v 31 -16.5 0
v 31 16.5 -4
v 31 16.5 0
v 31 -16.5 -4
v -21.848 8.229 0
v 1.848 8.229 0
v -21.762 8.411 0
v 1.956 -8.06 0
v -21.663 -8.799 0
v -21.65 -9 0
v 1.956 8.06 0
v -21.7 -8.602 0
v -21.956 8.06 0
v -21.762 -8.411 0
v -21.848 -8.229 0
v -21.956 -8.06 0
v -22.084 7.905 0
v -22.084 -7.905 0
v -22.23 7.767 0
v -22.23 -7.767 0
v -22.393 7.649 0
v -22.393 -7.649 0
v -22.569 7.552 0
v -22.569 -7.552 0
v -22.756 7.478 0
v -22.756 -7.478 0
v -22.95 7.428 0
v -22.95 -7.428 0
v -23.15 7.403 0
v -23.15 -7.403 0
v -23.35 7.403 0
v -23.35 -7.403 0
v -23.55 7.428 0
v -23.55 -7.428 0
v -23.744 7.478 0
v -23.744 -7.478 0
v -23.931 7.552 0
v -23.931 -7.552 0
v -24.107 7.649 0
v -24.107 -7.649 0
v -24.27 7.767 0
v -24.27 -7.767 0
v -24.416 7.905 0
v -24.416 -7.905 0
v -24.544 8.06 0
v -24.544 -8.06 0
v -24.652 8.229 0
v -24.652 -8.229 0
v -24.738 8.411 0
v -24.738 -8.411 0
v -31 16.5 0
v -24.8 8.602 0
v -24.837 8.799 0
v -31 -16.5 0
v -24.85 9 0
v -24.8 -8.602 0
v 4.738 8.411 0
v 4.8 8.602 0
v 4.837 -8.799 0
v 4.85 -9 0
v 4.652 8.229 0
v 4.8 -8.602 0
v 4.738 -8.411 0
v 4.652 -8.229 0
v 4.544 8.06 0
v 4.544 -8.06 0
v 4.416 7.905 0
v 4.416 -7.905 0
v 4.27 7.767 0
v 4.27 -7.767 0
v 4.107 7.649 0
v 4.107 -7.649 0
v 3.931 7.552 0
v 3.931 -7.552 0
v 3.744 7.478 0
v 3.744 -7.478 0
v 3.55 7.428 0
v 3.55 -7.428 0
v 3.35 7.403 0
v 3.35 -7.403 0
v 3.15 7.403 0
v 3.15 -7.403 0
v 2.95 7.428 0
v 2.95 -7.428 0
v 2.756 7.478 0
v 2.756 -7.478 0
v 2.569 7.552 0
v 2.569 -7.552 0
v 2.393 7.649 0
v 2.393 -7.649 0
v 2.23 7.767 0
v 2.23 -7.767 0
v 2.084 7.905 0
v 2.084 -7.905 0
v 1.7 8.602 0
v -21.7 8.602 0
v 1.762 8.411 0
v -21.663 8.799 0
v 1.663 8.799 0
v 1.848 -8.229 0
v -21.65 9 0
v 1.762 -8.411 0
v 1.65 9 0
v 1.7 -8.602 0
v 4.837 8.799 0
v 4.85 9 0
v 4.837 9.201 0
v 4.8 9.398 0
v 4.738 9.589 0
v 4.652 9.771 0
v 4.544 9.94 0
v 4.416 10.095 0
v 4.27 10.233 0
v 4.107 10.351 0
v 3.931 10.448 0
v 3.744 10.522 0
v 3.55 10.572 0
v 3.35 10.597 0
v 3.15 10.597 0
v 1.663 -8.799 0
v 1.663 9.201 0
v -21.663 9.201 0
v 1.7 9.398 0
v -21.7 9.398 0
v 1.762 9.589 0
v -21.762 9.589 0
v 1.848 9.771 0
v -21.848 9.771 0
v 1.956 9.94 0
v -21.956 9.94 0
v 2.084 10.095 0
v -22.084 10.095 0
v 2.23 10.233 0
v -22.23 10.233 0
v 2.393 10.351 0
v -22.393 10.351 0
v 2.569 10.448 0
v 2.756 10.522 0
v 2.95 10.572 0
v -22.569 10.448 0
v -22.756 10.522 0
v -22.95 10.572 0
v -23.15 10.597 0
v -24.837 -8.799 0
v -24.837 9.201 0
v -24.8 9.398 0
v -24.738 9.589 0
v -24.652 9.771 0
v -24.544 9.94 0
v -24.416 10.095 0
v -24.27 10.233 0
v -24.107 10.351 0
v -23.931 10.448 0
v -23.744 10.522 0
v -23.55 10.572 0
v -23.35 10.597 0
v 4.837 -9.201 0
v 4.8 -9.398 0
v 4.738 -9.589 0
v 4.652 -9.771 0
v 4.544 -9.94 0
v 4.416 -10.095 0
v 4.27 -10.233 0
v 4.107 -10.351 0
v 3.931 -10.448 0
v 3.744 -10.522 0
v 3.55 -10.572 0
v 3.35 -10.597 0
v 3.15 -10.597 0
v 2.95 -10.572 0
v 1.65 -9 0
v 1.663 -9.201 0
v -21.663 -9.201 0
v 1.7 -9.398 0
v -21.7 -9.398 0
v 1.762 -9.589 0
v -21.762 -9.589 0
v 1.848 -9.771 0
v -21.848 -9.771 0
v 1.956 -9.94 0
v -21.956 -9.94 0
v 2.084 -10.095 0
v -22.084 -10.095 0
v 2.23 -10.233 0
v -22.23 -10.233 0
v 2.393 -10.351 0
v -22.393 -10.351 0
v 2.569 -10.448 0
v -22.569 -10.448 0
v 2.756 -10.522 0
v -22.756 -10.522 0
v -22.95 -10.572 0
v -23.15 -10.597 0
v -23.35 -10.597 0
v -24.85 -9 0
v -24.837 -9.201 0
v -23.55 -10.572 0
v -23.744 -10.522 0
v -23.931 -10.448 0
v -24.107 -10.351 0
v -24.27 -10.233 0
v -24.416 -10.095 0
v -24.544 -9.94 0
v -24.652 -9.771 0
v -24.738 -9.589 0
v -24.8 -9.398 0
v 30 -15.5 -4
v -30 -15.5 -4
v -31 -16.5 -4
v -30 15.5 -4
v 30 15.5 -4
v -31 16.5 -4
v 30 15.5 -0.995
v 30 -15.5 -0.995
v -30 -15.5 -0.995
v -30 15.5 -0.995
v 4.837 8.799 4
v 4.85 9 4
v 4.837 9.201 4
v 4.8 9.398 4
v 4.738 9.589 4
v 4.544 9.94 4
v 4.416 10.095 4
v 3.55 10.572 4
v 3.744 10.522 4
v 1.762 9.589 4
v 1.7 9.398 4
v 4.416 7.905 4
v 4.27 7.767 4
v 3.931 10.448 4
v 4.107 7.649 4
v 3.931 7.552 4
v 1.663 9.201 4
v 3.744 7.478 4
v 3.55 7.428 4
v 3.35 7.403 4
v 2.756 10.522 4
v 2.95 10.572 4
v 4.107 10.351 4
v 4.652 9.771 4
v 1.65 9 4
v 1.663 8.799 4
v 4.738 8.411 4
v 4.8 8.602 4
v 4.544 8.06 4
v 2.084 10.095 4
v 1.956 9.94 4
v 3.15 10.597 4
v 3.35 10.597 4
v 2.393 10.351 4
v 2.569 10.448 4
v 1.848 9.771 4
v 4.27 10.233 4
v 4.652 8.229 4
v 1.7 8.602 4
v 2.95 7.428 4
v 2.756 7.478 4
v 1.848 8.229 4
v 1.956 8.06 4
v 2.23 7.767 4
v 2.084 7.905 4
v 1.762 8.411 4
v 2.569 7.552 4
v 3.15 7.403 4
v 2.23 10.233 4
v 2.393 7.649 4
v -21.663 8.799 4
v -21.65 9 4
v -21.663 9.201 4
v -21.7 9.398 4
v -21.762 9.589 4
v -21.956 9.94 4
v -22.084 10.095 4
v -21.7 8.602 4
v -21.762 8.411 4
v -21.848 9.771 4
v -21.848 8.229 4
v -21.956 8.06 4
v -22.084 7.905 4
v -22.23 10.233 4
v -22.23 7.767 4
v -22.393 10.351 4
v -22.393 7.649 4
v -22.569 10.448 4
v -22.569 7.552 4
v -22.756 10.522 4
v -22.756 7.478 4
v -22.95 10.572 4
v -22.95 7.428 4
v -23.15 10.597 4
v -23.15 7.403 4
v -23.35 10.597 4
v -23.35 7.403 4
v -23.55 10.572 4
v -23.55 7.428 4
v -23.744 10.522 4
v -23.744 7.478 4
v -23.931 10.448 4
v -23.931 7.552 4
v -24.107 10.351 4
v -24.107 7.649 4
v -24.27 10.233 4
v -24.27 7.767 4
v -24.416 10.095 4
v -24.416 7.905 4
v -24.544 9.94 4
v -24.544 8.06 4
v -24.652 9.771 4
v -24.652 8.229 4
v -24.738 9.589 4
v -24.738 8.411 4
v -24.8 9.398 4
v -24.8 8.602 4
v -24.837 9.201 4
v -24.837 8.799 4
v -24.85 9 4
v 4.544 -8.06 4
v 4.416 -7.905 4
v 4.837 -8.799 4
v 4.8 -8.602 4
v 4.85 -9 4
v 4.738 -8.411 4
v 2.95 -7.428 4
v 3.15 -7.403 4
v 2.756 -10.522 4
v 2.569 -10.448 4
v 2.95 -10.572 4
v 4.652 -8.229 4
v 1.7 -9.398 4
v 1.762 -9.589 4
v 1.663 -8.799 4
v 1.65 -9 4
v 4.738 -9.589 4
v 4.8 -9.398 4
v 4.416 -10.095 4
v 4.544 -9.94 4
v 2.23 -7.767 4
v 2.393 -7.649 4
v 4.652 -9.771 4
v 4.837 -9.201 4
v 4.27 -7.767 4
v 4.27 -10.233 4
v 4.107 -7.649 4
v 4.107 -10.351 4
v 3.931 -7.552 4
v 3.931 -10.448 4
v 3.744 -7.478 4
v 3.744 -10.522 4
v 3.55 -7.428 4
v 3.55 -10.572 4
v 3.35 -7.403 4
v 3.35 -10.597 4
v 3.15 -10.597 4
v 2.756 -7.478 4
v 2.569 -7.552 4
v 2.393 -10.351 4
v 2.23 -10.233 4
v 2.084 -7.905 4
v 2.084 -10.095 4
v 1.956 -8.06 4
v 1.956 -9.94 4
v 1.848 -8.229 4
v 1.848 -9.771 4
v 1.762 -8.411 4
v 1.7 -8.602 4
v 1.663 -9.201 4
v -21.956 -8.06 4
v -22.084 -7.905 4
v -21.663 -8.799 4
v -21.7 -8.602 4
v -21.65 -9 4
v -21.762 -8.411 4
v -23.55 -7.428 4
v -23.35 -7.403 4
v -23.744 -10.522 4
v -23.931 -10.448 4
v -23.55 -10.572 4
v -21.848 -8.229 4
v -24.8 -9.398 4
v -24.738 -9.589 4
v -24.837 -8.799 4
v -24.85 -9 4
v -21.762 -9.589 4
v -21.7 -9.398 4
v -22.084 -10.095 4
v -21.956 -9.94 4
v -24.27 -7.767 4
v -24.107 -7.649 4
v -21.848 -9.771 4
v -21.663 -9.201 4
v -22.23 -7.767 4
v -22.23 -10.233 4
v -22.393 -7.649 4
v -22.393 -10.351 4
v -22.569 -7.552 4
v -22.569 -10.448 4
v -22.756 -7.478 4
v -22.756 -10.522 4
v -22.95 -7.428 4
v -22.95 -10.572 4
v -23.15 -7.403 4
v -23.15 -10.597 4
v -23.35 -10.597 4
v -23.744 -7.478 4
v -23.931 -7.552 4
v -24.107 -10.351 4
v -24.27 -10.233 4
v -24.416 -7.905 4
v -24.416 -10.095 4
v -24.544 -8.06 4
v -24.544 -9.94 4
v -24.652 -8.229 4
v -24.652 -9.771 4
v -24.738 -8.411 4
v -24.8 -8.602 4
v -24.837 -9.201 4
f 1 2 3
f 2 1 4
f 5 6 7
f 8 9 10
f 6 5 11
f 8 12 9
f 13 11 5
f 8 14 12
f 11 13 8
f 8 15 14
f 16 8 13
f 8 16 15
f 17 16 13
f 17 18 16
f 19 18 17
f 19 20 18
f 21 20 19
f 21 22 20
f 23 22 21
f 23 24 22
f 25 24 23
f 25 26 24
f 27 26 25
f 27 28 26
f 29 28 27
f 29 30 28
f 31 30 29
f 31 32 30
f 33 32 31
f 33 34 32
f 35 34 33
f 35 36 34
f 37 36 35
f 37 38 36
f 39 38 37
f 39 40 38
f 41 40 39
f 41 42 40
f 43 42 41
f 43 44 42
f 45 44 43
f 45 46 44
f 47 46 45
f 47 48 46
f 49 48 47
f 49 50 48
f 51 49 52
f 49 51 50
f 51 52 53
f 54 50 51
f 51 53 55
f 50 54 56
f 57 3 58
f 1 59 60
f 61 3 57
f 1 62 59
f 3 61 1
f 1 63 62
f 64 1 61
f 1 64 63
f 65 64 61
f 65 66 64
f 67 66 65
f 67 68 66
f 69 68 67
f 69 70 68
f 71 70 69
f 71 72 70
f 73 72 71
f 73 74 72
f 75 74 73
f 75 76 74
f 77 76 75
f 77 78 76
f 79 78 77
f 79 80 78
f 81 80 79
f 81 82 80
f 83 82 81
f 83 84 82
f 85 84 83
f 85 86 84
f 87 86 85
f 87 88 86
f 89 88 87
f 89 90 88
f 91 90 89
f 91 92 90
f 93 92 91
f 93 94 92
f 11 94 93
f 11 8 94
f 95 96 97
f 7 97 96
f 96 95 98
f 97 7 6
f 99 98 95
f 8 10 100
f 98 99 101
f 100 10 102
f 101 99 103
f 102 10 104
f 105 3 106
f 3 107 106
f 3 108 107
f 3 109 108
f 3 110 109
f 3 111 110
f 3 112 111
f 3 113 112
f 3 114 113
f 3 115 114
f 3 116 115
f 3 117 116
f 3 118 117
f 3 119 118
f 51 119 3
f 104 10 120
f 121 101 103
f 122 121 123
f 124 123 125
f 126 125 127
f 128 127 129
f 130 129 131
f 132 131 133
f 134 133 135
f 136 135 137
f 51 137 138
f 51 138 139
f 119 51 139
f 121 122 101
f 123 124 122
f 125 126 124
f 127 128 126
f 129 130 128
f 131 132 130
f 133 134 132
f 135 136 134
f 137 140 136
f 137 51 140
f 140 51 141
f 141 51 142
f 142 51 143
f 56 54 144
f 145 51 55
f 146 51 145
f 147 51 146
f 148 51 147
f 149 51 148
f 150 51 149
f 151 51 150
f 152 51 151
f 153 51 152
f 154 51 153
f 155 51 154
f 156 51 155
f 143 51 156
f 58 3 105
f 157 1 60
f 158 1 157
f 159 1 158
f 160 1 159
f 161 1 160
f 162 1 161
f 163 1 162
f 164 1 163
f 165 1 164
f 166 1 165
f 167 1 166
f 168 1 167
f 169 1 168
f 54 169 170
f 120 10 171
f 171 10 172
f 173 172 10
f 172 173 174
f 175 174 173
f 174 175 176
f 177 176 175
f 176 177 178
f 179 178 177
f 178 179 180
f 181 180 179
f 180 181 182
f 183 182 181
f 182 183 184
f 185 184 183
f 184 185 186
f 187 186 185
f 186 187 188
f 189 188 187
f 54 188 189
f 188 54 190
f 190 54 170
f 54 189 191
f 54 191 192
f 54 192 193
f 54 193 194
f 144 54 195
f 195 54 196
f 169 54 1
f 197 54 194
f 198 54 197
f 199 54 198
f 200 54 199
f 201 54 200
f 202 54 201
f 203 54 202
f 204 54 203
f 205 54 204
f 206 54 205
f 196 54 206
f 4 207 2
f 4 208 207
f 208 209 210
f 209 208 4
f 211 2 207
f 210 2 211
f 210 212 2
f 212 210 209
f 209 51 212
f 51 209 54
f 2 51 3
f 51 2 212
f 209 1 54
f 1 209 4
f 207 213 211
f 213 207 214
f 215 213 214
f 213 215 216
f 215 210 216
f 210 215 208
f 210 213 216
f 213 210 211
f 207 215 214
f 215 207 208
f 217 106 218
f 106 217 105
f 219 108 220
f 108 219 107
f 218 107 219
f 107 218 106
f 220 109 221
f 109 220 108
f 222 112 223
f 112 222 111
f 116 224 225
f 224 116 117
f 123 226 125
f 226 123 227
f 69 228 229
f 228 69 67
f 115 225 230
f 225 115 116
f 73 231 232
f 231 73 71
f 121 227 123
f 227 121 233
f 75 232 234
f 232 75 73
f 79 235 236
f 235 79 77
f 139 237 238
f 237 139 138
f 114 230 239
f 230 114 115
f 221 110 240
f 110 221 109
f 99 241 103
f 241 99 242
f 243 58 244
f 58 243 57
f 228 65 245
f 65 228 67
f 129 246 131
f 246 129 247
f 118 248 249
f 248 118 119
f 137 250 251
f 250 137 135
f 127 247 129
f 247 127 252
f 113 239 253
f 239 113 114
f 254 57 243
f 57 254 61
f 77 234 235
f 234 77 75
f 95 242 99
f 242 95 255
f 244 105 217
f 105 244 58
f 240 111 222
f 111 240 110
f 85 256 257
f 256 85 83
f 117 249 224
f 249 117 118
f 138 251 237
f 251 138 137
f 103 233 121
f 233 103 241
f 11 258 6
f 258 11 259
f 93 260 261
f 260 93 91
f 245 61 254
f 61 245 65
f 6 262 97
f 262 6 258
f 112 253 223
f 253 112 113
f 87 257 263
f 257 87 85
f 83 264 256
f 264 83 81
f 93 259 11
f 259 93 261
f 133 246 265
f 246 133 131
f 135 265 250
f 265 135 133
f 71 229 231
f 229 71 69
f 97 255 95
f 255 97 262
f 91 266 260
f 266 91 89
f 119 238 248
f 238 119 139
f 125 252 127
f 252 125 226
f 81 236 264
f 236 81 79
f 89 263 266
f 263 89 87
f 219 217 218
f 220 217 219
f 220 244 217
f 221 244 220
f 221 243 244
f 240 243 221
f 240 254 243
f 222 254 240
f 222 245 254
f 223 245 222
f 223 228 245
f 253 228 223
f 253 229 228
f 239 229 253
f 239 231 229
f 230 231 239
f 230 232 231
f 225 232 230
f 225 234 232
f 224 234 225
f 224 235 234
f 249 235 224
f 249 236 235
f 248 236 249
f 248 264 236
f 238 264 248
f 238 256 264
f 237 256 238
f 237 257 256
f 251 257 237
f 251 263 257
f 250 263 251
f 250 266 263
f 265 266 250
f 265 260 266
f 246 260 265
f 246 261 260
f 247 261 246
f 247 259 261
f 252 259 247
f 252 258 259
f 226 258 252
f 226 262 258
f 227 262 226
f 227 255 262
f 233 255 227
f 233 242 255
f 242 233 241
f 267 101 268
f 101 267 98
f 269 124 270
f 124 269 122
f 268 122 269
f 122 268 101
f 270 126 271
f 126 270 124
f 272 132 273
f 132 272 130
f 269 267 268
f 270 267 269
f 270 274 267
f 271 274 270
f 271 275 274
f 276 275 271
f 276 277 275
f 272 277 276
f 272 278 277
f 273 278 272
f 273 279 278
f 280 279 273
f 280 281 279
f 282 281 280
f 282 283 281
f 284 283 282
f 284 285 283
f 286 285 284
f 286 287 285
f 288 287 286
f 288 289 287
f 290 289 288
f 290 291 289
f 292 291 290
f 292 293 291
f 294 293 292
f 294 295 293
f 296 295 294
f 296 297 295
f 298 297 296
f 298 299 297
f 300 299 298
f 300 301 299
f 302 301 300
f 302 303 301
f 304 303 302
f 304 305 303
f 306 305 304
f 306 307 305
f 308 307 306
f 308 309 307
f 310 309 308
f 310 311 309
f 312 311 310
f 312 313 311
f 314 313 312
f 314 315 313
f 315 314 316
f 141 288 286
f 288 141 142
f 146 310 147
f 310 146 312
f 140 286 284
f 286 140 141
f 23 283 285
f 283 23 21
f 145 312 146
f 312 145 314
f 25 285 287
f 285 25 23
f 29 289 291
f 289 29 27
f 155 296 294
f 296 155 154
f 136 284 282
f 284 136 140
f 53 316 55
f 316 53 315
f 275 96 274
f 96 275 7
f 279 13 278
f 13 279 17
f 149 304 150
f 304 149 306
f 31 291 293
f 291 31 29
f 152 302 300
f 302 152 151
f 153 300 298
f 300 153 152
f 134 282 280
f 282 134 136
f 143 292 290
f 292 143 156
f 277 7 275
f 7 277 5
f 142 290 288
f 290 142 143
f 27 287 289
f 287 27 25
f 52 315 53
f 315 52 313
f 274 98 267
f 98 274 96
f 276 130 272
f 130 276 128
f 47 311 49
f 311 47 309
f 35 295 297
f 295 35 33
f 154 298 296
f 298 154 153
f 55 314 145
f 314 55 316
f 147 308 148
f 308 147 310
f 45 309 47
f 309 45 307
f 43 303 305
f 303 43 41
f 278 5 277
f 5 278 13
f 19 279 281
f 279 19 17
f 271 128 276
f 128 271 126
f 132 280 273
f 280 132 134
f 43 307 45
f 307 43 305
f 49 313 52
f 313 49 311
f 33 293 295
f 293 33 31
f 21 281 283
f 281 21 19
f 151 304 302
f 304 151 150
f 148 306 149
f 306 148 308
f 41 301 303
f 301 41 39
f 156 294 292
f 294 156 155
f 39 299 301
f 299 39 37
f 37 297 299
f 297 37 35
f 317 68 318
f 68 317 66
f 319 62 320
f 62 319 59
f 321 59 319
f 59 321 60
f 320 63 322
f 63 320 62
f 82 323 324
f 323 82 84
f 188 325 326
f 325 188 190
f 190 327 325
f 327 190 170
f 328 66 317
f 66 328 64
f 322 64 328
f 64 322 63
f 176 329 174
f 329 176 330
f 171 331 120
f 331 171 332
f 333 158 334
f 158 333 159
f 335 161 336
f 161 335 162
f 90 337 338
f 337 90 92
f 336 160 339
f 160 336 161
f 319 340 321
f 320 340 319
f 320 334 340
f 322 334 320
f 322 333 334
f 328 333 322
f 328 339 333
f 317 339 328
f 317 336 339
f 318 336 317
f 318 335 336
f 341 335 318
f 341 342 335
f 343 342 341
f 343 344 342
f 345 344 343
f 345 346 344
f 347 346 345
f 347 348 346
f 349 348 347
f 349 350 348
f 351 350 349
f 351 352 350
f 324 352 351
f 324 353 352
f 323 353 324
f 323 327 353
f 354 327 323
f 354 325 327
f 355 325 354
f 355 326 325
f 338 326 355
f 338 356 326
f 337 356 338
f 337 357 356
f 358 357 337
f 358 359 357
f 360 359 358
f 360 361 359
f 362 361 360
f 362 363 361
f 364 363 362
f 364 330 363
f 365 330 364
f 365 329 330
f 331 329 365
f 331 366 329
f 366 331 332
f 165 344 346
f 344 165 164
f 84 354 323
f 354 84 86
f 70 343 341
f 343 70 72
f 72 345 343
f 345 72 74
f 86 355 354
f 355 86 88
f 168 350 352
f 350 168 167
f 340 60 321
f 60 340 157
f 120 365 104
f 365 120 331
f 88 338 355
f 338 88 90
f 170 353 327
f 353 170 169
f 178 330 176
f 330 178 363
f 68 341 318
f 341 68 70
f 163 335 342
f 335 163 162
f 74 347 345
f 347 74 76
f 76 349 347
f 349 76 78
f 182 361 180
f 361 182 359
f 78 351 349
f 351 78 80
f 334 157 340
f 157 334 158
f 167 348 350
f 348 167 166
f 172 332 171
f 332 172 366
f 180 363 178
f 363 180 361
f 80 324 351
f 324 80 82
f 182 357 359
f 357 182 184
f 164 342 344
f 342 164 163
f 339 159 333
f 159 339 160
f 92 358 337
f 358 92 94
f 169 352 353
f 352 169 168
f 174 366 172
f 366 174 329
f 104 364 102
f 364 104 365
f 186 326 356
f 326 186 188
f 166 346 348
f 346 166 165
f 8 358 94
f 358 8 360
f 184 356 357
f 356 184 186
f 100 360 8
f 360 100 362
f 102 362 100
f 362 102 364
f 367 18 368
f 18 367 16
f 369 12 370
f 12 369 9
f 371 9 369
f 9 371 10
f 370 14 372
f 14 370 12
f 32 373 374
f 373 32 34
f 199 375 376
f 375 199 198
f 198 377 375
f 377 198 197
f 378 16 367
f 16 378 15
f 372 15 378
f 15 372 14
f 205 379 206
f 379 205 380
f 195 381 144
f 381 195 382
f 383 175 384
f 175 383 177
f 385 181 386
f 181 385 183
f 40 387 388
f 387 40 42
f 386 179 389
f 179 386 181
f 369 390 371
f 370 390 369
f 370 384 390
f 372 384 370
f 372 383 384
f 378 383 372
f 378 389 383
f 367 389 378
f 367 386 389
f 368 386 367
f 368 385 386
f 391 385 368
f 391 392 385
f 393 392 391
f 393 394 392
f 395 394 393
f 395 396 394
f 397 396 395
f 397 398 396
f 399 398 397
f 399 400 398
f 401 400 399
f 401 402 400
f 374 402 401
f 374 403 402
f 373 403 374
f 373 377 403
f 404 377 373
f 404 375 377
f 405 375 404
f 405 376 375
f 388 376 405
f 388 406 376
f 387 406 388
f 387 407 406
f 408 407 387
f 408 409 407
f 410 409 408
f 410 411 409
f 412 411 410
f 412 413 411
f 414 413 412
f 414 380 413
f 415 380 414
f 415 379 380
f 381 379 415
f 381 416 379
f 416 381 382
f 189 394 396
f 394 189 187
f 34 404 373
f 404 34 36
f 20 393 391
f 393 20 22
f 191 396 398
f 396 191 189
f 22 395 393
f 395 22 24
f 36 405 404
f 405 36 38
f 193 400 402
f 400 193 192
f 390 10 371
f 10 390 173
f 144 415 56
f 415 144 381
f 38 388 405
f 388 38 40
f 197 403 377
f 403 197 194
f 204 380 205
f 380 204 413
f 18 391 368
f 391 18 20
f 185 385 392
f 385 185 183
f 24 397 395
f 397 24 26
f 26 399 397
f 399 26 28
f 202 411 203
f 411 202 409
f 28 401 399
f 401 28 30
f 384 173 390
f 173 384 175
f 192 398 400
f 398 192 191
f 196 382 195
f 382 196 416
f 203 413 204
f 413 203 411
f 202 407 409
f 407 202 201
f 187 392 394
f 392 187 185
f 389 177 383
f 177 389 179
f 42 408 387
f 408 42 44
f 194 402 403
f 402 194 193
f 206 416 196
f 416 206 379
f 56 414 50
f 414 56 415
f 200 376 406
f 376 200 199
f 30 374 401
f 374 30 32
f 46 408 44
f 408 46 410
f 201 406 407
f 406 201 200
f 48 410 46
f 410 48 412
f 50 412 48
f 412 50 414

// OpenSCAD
module aa0330(){
    translate([ 26.5/2-10, 18/2, 4/2])cylinder(r=1.6, h=4, center=true, $fn=50);
    translate([-26.5/2-10, 18/2, 4/2])cylinder(r=1.6, h=4, center=true, $fn=50);
    translate([ 26.5/2-10,-18/2, 4/2])cylinder(r=1.6, h=4, center=true, $fn=50);
    translate([-26.5/2-10,-18/2, 4/2])cylinder(r=1.6, h=4, center=true, $fn=50);
    //
    difference(){
        translate([0, 0, -4/2])cube([60+2, 31+2, 4],center=true);
        translate([0, 0, -1-4/2])cube([60, 31, 4.01],center=true);
    }
}


module bb(){
    difference(){
        union(){
        translate([0, -26/2-1/2, 6/2])cube([20, 1, 6],center=true);
        translate([0,  26/2+1/2, 6/2])cube([20, 1, 6],center=true);
        }
        //
        translate([-10+2/2, 0, 4/2])cube([2, 99, 4],center=true);
        translate([ 10-2/2, 0, 4/2])cube([2, 99, 4],center=true);
    }
    translate([ 23/2-0.2, 19/2, 4/2])cylinder(r=1.6, h=4, center=true, $fn=50);
    translate([-23/2+0.2, 19/2, 4/2])cylinder(r=1.6, h=4, center=true, $fn=50);
    translate([ 23/2-0.2,-19/2, 4/2])cylinder(r=1.6, h=4, center=true, $fn=50);
    translate([-23/2+0.2,-19/2, 4/2])cylinder(r=1.6, h=4, center=true, $fn=50);
    //
    difference(){
        translate([0, 0, -4/2])cube([60+2, 31+2, 4],center=true);
        translate([0, 0, -1-4/2])cube([60, 31, 4.01],center=true);
    }
}


//bb();
aa0330();
